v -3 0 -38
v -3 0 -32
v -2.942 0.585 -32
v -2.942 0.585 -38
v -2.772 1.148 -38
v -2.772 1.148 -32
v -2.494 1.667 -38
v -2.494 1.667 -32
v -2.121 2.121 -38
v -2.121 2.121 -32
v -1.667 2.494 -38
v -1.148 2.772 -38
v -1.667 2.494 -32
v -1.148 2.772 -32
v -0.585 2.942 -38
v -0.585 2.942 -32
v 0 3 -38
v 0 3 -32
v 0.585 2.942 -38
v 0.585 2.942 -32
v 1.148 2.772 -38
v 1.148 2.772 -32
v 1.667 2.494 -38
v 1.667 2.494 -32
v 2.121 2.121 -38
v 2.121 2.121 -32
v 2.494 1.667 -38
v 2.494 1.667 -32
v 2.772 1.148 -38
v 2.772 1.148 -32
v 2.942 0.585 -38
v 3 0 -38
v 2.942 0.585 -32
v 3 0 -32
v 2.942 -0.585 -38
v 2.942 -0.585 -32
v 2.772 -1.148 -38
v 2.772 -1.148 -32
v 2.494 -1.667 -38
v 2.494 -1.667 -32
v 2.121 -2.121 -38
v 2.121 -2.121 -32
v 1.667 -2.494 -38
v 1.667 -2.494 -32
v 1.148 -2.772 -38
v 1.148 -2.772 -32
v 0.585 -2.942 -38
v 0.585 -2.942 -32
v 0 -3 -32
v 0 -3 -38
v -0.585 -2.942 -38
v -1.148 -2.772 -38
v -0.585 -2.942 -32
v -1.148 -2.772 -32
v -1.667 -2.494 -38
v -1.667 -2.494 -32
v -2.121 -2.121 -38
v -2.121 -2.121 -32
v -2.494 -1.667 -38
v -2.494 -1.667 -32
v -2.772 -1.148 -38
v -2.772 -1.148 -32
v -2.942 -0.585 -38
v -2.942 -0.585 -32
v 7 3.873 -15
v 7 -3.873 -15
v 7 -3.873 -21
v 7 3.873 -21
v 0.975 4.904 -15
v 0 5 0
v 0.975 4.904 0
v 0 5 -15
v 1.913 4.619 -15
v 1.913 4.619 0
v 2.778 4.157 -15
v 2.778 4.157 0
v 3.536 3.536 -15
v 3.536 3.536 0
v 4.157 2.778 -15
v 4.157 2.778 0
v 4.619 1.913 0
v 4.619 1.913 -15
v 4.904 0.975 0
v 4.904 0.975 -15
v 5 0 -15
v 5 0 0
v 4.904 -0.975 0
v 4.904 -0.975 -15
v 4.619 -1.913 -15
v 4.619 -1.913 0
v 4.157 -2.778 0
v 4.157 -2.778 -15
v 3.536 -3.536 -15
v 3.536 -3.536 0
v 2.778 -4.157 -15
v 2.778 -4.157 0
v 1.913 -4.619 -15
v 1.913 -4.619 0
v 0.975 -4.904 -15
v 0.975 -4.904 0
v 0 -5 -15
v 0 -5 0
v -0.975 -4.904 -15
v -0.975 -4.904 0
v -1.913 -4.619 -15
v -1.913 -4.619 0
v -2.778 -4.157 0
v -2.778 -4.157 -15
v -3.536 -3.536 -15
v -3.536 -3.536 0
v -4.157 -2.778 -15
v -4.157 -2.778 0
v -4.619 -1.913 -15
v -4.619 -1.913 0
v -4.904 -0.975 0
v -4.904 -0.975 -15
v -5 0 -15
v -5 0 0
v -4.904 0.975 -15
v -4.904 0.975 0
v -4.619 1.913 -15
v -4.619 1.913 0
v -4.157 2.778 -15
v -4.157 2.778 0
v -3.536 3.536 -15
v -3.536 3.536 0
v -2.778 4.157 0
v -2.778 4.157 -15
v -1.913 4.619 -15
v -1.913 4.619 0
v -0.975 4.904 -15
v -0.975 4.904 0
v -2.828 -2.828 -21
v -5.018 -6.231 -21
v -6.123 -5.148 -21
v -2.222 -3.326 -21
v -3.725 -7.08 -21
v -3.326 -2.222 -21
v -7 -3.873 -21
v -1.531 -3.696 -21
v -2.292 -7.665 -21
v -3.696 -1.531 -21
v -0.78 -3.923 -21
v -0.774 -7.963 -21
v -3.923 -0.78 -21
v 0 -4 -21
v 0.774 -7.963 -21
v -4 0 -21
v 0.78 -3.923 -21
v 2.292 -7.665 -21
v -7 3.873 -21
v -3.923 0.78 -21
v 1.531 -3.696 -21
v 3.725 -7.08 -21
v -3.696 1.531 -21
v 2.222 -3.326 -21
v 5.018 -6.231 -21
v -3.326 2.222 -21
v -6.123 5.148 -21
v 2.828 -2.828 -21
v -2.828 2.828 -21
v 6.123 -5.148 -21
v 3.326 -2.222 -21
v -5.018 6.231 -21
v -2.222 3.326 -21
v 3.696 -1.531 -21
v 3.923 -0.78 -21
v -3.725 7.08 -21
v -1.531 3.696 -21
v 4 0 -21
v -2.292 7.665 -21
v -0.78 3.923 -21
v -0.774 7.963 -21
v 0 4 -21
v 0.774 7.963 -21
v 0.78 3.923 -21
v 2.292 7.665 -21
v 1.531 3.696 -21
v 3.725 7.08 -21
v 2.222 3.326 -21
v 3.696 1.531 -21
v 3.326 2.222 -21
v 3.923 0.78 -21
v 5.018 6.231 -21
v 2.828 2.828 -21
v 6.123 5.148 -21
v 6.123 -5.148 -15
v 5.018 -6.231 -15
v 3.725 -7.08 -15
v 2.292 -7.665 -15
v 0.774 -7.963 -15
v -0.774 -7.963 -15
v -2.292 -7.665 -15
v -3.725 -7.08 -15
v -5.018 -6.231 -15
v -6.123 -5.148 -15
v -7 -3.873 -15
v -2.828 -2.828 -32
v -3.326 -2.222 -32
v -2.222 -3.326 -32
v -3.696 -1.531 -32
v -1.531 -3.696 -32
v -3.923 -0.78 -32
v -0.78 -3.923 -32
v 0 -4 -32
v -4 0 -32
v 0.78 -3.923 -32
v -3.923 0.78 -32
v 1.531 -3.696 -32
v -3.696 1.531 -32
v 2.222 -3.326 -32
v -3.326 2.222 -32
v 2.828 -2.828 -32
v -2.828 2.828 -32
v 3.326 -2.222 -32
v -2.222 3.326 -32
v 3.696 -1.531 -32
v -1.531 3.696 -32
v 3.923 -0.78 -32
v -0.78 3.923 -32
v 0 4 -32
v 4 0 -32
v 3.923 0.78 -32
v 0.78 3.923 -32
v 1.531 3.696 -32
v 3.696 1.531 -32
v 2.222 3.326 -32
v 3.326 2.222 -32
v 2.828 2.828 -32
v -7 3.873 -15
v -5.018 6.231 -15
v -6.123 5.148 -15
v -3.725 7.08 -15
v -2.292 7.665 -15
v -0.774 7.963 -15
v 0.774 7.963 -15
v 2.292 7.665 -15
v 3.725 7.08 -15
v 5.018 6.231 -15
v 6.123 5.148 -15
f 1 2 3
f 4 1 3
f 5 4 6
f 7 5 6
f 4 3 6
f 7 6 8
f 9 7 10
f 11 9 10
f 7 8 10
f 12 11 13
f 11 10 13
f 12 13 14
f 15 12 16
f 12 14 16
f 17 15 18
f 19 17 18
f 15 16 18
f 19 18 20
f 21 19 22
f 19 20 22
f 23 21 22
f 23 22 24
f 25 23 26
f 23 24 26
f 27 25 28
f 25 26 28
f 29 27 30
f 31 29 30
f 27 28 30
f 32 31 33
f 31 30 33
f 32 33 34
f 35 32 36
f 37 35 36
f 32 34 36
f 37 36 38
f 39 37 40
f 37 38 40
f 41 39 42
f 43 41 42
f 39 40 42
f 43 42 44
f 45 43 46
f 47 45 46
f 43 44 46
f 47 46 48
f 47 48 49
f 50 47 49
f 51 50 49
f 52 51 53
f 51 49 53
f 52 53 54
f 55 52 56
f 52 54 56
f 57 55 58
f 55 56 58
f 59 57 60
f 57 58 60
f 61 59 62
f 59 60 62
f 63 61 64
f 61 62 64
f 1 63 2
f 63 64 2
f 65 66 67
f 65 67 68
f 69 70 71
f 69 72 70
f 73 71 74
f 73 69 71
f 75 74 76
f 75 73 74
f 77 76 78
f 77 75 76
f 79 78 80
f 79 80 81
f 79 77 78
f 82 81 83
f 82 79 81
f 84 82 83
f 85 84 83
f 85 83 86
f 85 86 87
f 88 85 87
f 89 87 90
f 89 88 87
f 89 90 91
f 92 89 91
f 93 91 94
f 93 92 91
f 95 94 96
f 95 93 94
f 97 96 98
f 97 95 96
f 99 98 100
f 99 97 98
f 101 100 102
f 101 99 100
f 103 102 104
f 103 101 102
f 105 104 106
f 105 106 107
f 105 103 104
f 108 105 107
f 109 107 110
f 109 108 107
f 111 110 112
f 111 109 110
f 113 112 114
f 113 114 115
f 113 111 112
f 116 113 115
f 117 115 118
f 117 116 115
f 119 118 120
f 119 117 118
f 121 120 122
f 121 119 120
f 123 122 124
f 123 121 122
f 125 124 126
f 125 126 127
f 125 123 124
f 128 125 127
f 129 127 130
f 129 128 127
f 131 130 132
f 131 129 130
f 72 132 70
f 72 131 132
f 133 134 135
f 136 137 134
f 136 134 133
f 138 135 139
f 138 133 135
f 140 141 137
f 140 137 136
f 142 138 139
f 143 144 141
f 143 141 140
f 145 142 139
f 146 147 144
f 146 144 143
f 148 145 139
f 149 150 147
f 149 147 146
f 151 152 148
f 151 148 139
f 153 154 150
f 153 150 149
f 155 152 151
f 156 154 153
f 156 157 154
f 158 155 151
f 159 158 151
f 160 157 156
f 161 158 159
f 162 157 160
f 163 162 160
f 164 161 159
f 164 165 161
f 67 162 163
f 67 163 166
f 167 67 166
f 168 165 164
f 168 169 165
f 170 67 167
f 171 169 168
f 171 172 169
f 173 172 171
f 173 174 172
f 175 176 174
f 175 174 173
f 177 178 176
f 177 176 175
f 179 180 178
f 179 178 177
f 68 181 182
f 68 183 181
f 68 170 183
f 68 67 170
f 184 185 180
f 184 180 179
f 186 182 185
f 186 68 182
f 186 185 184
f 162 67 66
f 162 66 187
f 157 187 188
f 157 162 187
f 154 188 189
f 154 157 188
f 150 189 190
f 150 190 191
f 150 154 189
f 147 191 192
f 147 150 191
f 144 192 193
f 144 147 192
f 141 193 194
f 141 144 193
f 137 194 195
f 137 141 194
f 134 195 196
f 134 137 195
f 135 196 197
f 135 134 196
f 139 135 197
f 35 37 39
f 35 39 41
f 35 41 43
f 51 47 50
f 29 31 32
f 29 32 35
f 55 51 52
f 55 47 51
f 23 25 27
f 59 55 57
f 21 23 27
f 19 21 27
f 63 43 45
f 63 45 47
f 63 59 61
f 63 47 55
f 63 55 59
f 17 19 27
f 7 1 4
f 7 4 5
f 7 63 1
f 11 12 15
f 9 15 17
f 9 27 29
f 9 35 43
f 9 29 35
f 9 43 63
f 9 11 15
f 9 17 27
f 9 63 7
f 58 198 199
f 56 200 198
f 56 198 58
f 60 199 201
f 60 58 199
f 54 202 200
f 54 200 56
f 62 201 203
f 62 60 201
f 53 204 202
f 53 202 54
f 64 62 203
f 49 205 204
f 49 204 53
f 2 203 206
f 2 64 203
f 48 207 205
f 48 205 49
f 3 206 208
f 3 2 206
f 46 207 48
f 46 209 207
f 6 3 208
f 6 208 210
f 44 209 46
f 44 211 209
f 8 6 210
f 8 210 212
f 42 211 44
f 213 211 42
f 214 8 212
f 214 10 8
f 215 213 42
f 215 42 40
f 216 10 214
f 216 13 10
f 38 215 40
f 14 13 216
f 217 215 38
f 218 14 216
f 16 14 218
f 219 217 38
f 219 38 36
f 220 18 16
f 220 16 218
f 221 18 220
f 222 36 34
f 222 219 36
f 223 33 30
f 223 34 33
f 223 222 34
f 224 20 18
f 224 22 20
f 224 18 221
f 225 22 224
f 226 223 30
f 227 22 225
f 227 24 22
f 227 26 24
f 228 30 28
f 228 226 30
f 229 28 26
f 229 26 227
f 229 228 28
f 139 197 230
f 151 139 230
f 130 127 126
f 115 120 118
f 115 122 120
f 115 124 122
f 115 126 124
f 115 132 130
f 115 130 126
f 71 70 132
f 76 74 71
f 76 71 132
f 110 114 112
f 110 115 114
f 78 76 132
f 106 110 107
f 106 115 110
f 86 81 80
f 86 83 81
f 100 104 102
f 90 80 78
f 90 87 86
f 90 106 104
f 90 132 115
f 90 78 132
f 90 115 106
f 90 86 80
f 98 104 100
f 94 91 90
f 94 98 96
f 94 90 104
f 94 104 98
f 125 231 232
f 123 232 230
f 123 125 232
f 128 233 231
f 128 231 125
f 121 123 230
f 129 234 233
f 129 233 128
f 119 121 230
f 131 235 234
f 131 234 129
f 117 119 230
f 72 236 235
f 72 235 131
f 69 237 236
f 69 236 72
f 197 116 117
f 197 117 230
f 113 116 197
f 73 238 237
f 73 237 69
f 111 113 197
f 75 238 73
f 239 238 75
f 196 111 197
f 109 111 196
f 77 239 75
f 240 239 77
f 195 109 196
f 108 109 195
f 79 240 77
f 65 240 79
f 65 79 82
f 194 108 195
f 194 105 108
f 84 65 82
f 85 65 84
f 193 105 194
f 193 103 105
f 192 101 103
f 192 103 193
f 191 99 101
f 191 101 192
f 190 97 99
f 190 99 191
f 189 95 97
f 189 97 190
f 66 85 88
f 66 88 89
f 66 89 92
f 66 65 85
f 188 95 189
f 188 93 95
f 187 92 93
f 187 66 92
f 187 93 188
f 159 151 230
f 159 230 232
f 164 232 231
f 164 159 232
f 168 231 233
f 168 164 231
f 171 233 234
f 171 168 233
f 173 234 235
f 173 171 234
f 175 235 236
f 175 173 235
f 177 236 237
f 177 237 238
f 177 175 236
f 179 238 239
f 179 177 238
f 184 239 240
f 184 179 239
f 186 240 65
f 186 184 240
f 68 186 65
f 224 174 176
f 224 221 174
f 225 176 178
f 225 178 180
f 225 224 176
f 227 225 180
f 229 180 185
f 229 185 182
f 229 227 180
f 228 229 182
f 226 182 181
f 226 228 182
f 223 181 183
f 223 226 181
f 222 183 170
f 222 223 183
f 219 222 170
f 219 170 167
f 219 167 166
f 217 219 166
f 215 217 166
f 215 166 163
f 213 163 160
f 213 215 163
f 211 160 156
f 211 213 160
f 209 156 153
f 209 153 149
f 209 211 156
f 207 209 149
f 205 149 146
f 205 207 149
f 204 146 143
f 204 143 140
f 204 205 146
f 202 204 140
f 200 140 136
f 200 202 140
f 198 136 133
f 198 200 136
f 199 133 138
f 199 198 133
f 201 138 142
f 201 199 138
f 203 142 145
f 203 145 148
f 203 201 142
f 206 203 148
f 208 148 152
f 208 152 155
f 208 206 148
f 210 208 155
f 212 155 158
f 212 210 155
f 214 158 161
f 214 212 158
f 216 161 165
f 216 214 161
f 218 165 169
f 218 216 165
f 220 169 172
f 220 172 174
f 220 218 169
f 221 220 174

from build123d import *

# Parameters (mm, degrees)
SKETCH_3_W          = 8
SKETCH_3_H          = 16.823898374
CUT_EXTRUDE_1_DEPTH = 10
SKETCH_5_OUTSIDE_W  = 23.858
SKETCH_5_OUTSIDE_H  = 27.858
SKETCH_5_OUTSIDE_R  = 8
CUT_EXTRUDE_2_DEPTH = 10
SKETCH_6_R          = 3
EXTRUDE_1_DEPTH     = 6


with BuildPart() as part:
    # 草图2 → 旋转1 (revolve)
    with BuildSketch(Plane(origin=(0, 0, 0), x_dir=(0, 0, -1), z_dir=(1, 0, 0))):
        Polygon((0, 0), (0, 5), (15, 5), (15, 9), (21, 9), (21, 4), (32, 4), (32, 0), align=None)
    revolve(axis=Axis((0, 0, 0), (0, 0, -1)))

    # 草图3 → 切除-拉伸1 (cut)
    with BuildSketch(Plane.XY.offset(-15)):
        with Locations((-11, -0.026043186)):
            Rectangle(SKETCH_3_W, SKETCH_3_H)
        with Locations((11, -0.026043186)):
            Rectangle(SKETCH_3_W, SKETCH_3_H)
    extrude(amount=-CUT_EXTRUDE_1_DEPTH, mode=Mode.SUBTRACT)

    # 草图5 outside → 切除-拉伸2 (cut)
    with BuildSketch(Plane(origin=(0, 0, -21), x_dir=(-1, 0, 0), z_dir=(0, 0, -1))):
        Rectangle(SKETCH_5_OUTSIDE_W, SKETCH_5_OUTSIDE_H)
        Circle(SKETCH_5_OUTSIDE_R, mode=Mode.SUBTRACT)
    extrude(amount=-CUT_EXTRUDE_2_DEPTH, mode=Mode.SUBTRACT)

    # 草图6 → 凸台-拉伸1 (add)
    with BuildSketch(Plane(origin=(0, 0, -32), x_dir=(-1, 0, 0), z_dir=(0, 0, -1))):
        Circle(SKETCH_6_R)
    extrude(amount=EXTRUDE_1_DEPTH)


solid = part.part
